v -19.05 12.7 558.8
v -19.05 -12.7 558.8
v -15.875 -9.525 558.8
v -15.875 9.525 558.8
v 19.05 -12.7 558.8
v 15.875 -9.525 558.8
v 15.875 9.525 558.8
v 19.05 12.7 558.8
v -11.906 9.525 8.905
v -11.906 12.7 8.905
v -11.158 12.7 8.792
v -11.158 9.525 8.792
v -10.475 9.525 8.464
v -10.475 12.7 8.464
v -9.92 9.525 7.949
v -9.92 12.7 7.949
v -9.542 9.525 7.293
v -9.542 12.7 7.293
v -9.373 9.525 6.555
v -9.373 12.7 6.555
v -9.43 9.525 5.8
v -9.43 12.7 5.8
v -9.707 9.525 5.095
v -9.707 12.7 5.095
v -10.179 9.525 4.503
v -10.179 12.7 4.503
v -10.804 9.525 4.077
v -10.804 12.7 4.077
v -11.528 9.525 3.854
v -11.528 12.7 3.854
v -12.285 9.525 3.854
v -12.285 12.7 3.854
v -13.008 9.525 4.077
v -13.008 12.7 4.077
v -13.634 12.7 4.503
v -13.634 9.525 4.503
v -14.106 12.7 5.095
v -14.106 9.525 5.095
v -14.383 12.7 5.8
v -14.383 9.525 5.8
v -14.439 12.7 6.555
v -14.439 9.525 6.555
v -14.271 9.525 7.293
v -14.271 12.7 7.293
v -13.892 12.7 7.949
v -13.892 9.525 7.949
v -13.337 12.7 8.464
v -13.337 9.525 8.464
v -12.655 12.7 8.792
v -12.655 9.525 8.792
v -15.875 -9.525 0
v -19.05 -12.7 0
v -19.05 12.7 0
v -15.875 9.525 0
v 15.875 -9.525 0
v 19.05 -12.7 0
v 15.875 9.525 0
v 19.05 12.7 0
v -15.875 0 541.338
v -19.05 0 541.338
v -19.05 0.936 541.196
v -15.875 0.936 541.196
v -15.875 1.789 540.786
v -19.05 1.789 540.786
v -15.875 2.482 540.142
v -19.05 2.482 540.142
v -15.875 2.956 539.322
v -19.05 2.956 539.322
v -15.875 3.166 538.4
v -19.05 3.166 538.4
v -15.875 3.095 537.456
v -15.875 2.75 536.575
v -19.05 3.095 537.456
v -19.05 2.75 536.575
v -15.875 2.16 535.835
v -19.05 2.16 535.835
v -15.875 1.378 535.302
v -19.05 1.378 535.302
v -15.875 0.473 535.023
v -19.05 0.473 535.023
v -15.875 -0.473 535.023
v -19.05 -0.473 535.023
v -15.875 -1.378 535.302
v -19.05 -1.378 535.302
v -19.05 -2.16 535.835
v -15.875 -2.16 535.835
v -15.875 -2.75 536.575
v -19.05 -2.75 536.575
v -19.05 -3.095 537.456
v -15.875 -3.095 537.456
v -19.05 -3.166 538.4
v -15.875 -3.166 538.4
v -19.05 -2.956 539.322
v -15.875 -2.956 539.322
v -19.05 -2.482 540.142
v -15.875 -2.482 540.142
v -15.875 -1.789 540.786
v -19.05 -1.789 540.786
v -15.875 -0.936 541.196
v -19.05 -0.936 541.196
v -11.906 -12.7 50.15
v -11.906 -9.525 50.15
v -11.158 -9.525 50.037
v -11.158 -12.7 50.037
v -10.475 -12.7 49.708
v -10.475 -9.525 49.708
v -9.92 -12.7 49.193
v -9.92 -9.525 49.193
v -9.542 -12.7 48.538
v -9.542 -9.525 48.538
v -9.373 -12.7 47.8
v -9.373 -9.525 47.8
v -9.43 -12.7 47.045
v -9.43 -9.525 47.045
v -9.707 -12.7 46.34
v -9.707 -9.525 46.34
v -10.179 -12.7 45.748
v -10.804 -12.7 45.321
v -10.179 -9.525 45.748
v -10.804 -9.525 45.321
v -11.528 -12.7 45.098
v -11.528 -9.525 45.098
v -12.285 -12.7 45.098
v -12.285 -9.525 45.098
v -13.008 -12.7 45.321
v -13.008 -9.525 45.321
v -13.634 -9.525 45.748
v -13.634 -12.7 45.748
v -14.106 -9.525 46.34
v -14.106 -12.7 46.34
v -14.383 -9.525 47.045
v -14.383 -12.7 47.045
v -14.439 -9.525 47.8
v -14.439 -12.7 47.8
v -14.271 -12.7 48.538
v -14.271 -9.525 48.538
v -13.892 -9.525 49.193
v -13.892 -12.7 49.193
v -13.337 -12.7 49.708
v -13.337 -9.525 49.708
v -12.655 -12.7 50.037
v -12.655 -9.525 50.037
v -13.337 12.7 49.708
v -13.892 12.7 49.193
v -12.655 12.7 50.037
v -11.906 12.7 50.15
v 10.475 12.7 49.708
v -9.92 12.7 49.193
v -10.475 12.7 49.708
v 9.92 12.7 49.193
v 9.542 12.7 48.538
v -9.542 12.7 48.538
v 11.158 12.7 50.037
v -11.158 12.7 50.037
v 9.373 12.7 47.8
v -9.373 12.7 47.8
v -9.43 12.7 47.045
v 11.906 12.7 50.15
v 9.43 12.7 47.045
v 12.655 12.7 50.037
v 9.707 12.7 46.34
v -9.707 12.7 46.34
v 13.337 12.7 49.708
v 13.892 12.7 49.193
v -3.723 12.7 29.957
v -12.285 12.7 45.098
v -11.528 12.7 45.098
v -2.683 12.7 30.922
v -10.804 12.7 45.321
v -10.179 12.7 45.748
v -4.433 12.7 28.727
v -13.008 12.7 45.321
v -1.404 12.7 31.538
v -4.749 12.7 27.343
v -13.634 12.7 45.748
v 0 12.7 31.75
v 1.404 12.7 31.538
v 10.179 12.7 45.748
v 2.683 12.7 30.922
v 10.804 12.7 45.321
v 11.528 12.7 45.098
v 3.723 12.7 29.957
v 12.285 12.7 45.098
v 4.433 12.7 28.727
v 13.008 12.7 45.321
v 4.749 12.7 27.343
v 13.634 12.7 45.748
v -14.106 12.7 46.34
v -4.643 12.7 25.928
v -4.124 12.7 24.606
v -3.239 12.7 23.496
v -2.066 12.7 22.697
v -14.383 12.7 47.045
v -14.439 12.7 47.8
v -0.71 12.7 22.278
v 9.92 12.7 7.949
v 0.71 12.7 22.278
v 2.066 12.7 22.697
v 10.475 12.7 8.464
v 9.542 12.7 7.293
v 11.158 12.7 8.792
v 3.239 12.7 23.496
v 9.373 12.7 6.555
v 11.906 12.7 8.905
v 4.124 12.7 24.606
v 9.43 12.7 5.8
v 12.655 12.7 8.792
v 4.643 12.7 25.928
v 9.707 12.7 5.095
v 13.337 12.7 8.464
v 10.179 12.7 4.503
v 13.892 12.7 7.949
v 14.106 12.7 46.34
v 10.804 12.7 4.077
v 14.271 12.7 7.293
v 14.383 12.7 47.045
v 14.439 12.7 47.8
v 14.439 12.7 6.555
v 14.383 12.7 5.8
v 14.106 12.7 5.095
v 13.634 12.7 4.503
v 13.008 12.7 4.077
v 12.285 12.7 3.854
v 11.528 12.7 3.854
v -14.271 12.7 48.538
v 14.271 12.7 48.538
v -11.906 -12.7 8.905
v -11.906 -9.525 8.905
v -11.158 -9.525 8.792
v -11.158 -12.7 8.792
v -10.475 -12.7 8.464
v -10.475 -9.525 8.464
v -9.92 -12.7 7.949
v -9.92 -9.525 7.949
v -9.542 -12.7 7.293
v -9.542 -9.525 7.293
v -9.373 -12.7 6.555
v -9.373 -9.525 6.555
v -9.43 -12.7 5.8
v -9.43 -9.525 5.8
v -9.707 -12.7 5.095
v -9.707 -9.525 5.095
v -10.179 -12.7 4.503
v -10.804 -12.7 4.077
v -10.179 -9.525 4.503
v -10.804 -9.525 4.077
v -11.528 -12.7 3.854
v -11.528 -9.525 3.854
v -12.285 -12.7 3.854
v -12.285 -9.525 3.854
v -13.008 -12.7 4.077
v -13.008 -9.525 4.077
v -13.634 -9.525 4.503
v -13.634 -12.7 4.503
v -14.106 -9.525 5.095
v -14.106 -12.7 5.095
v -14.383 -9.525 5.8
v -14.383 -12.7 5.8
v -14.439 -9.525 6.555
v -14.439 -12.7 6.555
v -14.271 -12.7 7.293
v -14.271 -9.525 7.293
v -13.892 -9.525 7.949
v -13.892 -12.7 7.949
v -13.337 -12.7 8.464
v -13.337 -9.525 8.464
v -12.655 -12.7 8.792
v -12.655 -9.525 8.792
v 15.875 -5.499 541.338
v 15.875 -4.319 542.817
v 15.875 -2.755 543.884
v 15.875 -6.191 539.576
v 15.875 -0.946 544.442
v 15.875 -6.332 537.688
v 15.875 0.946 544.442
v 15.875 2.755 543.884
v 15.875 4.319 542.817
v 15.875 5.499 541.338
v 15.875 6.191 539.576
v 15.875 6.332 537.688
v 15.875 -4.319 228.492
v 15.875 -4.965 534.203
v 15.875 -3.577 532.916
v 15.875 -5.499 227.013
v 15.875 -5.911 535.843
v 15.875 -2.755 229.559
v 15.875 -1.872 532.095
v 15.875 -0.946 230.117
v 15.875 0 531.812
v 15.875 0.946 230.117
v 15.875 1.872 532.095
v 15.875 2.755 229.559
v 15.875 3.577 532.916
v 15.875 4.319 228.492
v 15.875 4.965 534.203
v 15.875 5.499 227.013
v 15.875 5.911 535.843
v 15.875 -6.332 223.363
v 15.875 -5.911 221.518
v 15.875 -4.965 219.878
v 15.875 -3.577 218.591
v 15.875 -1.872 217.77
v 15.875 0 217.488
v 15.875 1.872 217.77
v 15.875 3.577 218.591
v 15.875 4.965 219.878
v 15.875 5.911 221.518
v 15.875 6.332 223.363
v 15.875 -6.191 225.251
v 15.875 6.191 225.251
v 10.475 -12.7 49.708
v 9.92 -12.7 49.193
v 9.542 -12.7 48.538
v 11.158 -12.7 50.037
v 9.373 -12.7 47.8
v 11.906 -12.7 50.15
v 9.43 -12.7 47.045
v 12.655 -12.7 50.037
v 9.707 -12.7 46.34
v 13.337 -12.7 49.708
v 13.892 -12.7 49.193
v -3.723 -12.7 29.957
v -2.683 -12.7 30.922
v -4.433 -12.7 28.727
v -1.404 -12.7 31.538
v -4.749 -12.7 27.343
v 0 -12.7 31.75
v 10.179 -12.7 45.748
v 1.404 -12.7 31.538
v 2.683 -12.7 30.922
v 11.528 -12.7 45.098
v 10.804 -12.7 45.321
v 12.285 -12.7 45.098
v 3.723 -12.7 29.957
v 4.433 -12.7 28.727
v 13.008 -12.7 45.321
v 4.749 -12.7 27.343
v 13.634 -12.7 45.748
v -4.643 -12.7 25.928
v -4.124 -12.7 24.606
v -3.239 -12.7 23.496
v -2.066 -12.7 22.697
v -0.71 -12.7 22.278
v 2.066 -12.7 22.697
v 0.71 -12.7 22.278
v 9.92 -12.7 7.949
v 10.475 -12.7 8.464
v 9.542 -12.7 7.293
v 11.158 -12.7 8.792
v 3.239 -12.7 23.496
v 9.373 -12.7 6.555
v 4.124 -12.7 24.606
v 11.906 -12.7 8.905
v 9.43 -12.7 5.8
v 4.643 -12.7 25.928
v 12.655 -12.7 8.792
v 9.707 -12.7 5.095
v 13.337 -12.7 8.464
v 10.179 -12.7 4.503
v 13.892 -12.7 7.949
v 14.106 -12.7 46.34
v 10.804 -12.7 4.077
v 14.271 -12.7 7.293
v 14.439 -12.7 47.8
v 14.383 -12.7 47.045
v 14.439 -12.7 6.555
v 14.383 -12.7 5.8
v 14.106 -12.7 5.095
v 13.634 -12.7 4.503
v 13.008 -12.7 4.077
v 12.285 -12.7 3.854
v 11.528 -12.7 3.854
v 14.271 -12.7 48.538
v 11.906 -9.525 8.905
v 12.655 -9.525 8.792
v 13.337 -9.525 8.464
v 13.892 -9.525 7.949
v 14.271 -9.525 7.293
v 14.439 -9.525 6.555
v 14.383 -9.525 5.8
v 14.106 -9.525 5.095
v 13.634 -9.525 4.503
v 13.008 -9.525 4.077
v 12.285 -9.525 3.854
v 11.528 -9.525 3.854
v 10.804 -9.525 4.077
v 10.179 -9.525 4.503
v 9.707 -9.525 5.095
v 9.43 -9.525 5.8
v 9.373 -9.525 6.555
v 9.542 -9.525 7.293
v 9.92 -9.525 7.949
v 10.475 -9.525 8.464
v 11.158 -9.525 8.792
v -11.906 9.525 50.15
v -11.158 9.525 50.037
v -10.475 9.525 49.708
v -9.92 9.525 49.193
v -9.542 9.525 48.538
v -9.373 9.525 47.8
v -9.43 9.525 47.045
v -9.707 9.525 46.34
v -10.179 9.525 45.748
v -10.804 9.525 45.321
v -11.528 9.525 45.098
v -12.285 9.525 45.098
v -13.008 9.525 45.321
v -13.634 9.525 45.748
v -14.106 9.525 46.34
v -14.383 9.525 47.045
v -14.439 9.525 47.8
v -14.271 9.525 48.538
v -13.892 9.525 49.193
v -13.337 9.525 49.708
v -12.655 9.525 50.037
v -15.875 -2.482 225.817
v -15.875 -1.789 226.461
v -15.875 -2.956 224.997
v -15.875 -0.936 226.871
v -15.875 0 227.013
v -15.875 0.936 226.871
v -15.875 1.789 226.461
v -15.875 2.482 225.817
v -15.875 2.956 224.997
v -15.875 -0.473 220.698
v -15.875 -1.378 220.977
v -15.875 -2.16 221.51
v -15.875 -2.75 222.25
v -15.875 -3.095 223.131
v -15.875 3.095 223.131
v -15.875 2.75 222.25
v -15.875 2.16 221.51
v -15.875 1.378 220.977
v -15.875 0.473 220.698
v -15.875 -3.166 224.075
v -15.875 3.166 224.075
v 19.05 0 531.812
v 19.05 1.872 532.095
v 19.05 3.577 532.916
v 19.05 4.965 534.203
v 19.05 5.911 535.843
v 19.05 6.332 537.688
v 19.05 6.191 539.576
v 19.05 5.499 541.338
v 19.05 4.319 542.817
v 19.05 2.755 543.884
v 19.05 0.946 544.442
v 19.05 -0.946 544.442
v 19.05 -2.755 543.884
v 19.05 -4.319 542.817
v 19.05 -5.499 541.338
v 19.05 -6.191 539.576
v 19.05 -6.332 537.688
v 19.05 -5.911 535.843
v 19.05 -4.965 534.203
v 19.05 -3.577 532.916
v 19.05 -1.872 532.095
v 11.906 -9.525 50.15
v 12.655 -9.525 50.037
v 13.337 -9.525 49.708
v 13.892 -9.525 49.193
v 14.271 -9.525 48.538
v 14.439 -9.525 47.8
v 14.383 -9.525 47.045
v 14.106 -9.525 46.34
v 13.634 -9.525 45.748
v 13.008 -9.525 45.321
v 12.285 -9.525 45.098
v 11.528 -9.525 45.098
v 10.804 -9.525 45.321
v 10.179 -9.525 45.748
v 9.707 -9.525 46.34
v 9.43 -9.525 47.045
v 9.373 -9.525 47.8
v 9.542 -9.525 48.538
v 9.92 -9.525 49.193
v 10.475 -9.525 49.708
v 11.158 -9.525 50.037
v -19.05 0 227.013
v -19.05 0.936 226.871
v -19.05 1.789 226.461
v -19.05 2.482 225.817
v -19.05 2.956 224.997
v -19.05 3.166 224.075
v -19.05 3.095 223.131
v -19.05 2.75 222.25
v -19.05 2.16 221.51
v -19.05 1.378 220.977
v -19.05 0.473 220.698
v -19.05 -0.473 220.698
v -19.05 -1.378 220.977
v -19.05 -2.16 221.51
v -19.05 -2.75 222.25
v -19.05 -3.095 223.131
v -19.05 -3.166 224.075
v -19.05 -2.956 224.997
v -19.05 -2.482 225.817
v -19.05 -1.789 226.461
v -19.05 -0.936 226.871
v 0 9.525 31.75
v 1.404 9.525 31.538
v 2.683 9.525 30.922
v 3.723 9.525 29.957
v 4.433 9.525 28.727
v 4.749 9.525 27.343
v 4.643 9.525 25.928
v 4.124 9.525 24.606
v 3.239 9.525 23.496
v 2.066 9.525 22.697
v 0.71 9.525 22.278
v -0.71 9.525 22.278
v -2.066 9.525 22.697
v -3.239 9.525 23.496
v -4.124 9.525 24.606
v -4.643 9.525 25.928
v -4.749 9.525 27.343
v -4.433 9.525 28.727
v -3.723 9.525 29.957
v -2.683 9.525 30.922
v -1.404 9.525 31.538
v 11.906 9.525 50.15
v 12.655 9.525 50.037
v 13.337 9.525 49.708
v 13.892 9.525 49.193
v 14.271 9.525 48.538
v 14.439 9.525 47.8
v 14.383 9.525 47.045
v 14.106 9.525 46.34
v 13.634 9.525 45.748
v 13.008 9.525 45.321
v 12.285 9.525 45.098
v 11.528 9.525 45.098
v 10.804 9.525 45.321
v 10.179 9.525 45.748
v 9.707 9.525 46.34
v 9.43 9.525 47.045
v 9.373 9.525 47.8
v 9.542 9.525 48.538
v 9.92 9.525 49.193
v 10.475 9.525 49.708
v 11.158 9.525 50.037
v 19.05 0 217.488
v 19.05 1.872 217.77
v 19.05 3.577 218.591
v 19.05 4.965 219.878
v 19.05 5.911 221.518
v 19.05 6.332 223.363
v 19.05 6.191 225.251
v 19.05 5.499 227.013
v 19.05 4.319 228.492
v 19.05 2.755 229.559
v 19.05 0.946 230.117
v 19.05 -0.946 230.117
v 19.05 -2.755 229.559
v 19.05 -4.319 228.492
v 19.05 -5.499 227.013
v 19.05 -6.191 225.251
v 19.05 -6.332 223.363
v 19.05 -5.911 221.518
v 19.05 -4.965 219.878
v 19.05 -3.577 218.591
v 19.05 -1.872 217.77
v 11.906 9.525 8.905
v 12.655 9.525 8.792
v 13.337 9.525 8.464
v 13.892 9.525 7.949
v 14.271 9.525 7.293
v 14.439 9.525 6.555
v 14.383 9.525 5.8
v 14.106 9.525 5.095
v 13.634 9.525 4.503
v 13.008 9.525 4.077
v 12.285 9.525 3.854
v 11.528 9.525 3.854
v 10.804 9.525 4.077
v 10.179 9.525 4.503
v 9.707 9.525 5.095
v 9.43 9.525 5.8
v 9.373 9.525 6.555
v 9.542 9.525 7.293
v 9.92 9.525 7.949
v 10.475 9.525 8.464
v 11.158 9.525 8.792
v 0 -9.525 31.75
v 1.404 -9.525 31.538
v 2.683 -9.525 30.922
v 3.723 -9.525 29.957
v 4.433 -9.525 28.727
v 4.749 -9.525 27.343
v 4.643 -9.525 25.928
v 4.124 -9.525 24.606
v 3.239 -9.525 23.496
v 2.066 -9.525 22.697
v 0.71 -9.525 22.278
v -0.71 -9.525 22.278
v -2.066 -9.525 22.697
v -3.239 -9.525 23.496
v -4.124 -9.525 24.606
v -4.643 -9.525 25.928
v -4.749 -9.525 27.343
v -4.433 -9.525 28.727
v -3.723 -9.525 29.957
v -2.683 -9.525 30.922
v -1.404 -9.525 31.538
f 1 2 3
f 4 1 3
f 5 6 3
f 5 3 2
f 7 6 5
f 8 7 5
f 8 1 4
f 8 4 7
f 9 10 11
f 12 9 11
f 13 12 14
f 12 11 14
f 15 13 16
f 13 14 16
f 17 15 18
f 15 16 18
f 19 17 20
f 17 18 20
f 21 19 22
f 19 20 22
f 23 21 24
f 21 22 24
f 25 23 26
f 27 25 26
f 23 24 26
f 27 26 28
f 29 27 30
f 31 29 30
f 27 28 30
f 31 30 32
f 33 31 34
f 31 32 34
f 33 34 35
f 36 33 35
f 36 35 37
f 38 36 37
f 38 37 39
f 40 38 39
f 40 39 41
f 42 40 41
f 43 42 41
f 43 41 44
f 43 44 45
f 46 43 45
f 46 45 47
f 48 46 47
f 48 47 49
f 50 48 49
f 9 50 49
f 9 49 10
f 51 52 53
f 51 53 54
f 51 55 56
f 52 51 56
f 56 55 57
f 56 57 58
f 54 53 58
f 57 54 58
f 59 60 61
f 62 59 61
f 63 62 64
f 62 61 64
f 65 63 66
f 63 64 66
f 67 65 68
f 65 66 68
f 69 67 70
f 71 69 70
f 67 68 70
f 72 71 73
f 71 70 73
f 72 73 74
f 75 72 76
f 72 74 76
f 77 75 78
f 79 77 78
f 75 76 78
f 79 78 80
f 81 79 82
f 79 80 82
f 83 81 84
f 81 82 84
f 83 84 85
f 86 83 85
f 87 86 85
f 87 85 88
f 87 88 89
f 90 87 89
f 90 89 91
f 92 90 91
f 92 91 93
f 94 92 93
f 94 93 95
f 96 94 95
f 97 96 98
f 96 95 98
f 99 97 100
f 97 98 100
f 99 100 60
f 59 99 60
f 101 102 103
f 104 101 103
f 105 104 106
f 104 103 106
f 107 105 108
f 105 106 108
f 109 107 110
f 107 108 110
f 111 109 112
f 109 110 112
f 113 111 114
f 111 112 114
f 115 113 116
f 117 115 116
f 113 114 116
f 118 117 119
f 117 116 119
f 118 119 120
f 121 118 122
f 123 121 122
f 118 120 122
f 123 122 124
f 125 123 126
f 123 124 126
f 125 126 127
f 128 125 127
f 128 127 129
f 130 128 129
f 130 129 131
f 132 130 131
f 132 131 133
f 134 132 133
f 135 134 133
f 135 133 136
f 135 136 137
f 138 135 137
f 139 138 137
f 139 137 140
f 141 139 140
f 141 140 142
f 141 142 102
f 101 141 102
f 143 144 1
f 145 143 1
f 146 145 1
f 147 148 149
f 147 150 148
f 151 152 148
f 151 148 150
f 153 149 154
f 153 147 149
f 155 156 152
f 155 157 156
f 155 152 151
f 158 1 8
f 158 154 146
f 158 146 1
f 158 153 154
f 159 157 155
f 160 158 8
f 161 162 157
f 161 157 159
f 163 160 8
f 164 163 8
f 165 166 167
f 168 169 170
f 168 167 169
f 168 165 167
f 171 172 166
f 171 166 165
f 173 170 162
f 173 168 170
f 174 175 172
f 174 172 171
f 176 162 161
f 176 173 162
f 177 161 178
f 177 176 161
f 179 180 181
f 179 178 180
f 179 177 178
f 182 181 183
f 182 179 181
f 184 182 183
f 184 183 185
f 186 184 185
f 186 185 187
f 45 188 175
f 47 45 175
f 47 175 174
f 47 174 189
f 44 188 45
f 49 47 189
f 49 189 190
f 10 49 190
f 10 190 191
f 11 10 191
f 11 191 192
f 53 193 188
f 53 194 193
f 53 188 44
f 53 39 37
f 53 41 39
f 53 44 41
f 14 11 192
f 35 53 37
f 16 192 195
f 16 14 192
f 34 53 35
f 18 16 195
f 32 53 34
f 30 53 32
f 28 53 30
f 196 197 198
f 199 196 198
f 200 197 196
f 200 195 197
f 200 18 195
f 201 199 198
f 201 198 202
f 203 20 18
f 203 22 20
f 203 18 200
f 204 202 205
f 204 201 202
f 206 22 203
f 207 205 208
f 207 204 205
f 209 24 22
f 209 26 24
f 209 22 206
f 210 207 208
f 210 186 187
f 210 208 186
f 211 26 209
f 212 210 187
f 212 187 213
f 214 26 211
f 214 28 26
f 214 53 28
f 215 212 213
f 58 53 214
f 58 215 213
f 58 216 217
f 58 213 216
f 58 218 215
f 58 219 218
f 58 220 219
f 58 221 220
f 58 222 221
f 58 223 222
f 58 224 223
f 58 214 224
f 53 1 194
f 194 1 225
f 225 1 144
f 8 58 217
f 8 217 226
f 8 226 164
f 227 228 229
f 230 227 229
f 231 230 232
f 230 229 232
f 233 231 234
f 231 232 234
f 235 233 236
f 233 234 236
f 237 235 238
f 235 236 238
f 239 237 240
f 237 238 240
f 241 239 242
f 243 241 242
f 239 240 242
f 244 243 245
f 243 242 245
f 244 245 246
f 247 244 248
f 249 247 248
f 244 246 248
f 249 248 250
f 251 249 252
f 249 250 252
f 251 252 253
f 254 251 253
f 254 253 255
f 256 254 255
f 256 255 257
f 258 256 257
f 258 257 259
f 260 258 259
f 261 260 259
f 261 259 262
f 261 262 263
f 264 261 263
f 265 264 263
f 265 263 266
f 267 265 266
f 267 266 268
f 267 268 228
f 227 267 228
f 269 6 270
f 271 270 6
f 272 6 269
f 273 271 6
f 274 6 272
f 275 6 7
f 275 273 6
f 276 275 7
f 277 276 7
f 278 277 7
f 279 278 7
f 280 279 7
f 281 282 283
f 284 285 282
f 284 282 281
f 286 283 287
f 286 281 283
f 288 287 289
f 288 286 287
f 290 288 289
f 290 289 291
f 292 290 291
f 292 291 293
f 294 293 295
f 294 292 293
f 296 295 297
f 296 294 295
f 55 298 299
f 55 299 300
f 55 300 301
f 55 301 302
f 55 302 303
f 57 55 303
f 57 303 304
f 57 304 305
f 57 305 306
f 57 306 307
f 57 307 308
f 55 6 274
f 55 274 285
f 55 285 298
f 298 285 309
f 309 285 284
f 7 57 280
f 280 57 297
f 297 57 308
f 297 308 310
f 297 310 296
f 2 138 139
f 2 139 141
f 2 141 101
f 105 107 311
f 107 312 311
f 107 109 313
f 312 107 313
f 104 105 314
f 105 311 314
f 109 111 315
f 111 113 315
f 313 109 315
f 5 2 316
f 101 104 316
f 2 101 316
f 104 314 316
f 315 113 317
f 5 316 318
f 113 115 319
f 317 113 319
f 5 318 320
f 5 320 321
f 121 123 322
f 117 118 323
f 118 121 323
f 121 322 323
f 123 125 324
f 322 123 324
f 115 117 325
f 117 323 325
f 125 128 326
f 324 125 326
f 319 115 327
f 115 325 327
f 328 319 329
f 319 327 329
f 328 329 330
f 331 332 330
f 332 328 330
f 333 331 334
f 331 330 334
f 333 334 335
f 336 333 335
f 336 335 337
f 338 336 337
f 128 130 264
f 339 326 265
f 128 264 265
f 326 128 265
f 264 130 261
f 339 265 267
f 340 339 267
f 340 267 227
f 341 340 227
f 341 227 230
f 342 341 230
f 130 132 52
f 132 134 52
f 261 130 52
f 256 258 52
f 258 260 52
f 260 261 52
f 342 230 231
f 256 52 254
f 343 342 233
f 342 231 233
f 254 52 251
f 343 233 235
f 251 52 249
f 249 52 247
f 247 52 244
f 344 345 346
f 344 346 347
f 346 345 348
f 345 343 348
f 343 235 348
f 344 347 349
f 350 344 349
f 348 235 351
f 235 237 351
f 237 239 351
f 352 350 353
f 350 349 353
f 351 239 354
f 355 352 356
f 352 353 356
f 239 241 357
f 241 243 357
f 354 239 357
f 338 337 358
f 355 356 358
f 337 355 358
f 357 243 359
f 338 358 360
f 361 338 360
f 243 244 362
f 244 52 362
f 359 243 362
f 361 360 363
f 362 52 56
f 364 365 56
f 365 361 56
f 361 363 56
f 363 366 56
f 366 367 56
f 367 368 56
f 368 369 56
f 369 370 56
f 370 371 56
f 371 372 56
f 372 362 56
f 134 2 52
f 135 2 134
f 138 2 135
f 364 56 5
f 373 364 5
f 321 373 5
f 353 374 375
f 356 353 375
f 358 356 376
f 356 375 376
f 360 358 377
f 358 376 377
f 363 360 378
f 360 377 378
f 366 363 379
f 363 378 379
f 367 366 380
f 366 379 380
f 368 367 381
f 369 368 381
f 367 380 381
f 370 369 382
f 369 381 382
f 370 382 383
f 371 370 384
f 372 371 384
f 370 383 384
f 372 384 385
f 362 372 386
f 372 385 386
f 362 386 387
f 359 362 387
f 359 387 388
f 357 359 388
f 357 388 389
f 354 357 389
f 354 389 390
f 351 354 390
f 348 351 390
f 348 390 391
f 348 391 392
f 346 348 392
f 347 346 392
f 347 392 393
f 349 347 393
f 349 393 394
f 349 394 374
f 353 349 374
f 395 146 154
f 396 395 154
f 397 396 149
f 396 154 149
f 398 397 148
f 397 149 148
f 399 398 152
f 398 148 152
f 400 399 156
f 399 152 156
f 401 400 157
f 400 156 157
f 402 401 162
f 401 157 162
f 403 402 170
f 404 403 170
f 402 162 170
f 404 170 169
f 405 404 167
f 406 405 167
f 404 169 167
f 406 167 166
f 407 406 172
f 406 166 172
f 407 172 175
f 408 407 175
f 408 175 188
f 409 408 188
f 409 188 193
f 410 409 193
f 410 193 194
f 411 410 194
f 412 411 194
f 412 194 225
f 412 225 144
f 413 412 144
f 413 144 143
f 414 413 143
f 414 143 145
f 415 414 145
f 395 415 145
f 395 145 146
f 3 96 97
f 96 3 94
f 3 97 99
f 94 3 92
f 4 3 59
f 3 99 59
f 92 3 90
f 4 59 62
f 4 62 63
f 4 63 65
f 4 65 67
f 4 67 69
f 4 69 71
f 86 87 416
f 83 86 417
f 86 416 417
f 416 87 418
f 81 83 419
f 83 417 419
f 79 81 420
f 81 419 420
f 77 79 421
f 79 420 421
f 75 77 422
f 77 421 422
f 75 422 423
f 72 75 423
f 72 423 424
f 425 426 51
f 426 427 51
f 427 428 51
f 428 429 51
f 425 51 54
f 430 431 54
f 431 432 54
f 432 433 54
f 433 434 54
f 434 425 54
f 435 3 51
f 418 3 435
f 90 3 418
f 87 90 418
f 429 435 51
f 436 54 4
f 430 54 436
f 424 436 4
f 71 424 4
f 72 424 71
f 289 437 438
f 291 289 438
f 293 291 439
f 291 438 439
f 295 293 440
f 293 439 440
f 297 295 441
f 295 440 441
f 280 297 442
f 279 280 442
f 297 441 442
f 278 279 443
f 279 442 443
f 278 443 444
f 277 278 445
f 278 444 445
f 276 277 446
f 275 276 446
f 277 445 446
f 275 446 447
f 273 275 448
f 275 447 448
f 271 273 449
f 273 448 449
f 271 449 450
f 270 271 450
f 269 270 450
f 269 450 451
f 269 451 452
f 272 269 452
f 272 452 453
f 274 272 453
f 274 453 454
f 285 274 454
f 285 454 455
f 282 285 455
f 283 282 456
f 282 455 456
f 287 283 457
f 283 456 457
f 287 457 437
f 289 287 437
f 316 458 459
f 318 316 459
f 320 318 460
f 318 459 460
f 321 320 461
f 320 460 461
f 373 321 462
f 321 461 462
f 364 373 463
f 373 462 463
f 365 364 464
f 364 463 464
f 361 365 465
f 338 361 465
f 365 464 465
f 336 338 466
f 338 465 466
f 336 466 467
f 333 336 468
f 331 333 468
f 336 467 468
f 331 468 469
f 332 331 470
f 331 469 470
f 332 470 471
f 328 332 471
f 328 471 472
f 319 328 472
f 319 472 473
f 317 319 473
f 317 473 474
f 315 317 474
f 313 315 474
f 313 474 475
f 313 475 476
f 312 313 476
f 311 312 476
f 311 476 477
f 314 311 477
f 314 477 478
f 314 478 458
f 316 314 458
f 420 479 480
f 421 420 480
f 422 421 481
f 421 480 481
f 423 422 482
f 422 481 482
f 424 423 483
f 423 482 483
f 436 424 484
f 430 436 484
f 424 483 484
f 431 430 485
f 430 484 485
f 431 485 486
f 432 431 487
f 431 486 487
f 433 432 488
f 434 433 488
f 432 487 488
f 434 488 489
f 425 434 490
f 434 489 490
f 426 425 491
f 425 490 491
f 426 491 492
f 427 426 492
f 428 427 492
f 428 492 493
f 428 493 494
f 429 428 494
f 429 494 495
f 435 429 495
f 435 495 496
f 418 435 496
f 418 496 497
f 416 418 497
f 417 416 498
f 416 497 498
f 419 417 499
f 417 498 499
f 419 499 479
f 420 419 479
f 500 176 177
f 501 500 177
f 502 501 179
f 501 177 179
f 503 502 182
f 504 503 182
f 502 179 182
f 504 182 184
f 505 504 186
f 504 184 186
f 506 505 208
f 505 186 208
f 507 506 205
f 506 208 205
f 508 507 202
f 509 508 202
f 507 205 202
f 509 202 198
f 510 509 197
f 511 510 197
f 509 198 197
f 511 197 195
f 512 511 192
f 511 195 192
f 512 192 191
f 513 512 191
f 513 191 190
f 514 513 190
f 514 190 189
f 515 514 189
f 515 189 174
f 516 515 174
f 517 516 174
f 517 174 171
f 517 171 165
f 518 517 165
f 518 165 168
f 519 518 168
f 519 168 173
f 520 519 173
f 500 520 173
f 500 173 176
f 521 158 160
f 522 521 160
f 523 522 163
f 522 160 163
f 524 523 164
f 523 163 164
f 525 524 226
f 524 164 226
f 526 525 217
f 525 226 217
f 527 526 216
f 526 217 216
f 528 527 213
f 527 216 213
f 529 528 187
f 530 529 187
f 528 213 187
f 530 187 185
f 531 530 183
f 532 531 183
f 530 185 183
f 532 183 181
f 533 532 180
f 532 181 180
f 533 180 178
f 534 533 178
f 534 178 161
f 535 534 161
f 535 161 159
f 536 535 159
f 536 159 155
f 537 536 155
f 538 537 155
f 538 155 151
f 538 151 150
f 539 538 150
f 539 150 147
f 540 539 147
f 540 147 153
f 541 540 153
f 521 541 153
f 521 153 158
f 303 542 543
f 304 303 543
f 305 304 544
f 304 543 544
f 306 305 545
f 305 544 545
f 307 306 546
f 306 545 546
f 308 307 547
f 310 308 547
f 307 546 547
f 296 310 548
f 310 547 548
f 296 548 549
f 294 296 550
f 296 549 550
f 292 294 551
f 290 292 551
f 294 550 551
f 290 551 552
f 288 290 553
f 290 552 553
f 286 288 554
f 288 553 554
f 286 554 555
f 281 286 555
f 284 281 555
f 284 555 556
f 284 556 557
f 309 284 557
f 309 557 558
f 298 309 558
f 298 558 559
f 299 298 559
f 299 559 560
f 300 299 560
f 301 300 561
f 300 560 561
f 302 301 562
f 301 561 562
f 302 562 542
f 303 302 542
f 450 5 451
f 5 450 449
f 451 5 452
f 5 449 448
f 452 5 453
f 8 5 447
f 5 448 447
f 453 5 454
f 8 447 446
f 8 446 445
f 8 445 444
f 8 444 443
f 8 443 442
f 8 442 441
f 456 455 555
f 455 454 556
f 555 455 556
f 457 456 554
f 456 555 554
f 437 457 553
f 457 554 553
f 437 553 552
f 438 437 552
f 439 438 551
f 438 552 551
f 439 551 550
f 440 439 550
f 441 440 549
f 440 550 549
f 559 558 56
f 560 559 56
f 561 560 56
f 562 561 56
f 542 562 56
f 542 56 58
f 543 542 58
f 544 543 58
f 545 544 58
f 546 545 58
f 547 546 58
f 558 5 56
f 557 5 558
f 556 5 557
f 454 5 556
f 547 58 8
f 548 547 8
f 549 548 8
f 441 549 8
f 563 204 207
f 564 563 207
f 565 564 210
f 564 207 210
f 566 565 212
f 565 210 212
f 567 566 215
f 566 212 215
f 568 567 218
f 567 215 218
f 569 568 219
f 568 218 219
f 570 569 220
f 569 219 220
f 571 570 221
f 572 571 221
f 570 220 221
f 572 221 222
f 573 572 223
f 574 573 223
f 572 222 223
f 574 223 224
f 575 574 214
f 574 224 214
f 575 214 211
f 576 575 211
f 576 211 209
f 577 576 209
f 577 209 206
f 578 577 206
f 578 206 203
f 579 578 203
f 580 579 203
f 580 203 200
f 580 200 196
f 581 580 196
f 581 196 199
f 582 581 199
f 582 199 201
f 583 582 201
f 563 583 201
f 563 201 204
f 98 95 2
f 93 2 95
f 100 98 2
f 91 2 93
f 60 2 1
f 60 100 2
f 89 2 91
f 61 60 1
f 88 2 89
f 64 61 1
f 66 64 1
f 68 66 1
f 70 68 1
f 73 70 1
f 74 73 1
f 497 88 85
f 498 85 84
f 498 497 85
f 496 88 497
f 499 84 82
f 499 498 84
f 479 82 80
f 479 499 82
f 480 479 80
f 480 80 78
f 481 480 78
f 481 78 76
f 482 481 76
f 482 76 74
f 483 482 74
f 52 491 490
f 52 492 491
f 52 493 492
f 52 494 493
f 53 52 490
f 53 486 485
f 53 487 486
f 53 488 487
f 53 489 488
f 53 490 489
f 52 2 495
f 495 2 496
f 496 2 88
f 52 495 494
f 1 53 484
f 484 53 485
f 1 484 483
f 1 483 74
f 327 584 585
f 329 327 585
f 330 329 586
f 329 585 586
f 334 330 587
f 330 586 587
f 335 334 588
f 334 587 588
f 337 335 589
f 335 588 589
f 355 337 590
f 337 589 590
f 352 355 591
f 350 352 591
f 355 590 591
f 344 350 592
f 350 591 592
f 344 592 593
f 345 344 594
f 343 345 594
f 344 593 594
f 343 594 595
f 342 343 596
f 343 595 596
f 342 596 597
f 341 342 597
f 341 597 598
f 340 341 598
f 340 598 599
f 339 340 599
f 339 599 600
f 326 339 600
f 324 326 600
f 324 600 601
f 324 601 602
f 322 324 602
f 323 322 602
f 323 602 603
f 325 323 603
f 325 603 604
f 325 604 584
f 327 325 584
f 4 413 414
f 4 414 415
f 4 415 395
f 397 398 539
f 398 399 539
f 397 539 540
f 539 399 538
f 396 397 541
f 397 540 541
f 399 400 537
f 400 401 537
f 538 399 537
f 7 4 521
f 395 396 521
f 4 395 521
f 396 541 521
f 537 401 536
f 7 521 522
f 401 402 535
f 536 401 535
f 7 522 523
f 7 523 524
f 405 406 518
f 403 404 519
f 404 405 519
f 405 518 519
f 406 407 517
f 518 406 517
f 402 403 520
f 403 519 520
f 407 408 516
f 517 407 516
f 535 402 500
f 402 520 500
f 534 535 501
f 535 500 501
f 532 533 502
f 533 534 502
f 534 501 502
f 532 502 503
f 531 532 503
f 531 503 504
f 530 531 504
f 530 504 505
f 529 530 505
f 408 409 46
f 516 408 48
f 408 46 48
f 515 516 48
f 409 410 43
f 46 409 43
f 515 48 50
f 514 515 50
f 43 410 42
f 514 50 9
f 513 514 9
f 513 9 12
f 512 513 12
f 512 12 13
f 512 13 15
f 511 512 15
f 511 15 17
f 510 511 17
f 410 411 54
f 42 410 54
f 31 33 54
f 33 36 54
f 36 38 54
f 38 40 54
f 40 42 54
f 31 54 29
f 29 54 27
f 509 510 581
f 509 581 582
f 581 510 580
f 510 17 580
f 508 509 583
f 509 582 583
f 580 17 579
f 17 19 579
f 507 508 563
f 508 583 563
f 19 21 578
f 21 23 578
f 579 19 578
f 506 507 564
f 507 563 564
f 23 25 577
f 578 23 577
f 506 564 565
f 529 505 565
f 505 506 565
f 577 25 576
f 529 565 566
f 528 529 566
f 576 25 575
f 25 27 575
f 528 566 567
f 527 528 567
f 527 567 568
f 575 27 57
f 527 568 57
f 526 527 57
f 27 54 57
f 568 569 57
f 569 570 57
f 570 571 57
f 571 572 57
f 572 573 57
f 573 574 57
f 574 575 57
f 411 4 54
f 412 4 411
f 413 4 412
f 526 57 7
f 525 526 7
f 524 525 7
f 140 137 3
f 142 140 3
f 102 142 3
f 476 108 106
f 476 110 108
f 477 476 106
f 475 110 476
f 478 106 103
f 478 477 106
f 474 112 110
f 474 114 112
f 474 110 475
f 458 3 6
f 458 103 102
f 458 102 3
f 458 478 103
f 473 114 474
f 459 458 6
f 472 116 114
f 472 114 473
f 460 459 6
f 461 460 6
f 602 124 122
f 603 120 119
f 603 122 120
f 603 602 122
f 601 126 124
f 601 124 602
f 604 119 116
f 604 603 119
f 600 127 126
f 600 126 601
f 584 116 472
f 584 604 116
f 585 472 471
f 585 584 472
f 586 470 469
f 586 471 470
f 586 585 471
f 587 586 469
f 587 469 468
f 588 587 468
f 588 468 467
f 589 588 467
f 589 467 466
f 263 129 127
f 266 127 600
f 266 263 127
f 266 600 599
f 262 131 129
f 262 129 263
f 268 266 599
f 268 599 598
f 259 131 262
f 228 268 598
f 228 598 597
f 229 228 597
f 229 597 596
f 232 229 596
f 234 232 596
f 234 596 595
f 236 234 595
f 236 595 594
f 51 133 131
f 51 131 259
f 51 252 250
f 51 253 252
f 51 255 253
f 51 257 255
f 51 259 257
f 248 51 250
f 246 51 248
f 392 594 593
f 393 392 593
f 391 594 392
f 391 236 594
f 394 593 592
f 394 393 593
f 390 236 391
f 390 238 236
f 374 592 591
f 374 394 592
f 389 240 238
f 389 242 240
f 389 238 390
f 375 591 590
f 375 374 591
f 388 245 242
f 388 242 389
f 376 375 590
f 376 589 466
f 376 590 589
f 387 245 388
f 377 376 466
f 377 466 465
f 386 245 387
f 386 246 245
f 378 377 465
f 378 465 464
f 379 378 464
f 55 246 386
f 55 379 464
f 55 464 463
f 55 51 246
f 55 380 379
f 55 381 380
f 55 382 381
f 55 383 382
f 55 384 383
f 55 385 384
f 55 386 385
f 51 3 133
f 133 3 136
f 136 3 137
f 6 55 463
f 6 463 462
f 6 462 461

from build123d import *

# Parameters (mm, degrees)
SKETCH1_W           = 38.1
SKETCH1_H           = 25.4
SKETCH1_W_2         = 31.75
SKETCH1_H_2         = 19.05
BOSS_EXTRUDE1_DEPTH = 558.8
CUT_EXTRUDE1_REACH  = 561.701
SKETCH2_R           = 4.7625
SKETCH2_R_2         = 2.54
SKETCH3_R           = 3.175
CUT_EXTRUDE2_DEPTH  = 3.175
SKETCH4_R           = 6.35
CUT_EXTRUDE3_DEPTH  = 3.175


with BuildPart() as part:
    # Sketch1 → Boss-Extrude1 (new body)
    with BuildSketch(Plane.XY):
        Rectangle(SKETCH1_W, SKETCH1_H)
        Rectangle(SKETCH1_W_2, SKETCH1_H_2, mode=Mode.SUBTRACT)
    extrude(amount=BOSS_EXTRUDE1_DEPTH)

    # Cut-Extrude1: up to this face of the body (flat: up to its plane)
    cut_extrude1_end = Plane(part.part.faces().sort_by_distance((0, -12.7, 279.4))[0])
    # Sketch2 → Cut-Extrude1 (cut, up to the picked face)
    with BuildSketch(Plane(origin=(0, 12.7, 0), x_dir=(1, 0, 0), z_dir=(0, 1, 0)), mode=Mode.PRIVATE) as cut_extrude1_sk1:
        with Locations(Location((0, -26.9875, 0), (0, 0, 270))):
            Circle(SKETCH2_R)
    cut_extrude1_tool1 = split(extrude(cut_extrude1_sk1.sketch, amount=-CUT_EXTRUDE1_REACH, mode=Mode.PRIVATE), bisect_by=cut_extrude1_end, keep=Keep.BOTH, mode=Mode.PRIVATE)
    # Sketch2 → Cut-Extrude1 (cut, up to the picked face)
    with BuildSketch(Plane(origin=(0, 12.7, 0), x_dir=(1, 0, 0), z_dir=(0, 1, 0)), mode=Mode.PRIVATE) as cut_extrude1_sk2:
        with Locations(Location((11.90625, -47.609729928, 0), (0, 0, 270))):
            Circle(SKETCH2_R_2)
    cut_extrude1_tool2 = split(extrude(cut_extrude1_sk2.sketch, amount=-CUT_EXTRUDE1_REACH, mode=Mode.PRIVATE), bisect_by=cut_extrude1_end, keep=Keep.BOTH, mode=Mode.PRIVATE)
    # Sketch2 → Cut-Extrude1 (cut, up to the picked face)
    with BuildSketch(Plane(origin=(0, 12.7, 0), x_dir=(1, 0, 0), z_dir=(0, 1, 0)), mode=Mode.PRIVATE) as cut_extrude1_sk3:
        with Locations(Location((-11.90625, -47.609729928, 0), (0, 0, 270))):
            Circle(SKETCH2_R_2)
    cut_extrude1_tool3 = split(extrude(cut_extrude1_sk3.sketch, amount=-CUT_EXTRUDE1_REACH, mode=Mode.PRIVATE), bisect_by=cut_extrude1_end, keep=Keep.BOTH, mode=Mode.PRIVATE)
    # Sketch2 → Cut-Extrude1 (cut, up to the picked face)
    with BuildSketch(Plane(origin=(0, 12.7, 0), x_dir=(1, 0, 0), z_dir=(0, 1, 0)), mode=Mode.PRIVATE) as cut_extrude1_sk4:
        with Locations(Location((-11.90625, -6.365270072, 0), (0, 0, 270))):
            Circle(SKETCH2_R_2)
    cut_extrude1_tool4 = split(extrude(cut_extrude1_sk4.sketch, amount=-CUT_EXTRUDE1_REACH, mode=Mode.PRIVATE), bisect_by=cut_extrude1_end, keep=Keep.BOTH, mode=Mode.PRIVATE)
    # Sketch2 → Cut-Extrude1 (cut, up to the picked face)
    with BuildSketch(Plane(origin=(0, 12.7, 0), x_dir=(1, 0, 0), z_dir=(0, 1, 0)), mode=Mode.PRIVATE) as cut_extrude1_sk5:
        with Locations(Location((11.90625, -6.365270072, 0), (0, 0, 270))):
            Circle(SKETCH2_R_2)
    cut_extrude1_tool5 = split(extrude(cut_extrude1_sk5.sketch, amount=-CUT_EXTRUDE1_REACH, mode=Mode.PRIVATE), bisect_by=cut_extrude1_end, keep=Keep.BOTH, mode=Mode.PRIVATE)
    add(cut_extrude1_tool1.solids().sort_by(Axis((0, 12.7, 26.9875), (0, -1, 0)))[0], mode=Mode.SUBTRACT)
    add(cut_extrude1_tool2.solids().sort_by(Axis((11.90625, 12.7, 47.60973), (0, -1, 0)))[0], mode=Mode.SUBTRACT)
    add(cut_extrude1_tool3.solids().sort_by(Axis((-11.90625, 12.7, 47.60973), (0, -1, 0)))[0], mode=Mode.SUBTRACT)
    add(cut_extrude1_tool4.solids().sort_by(Axis((-11.90625, 12.7, 6.36527), (0, -1, 0)))[0], mode=Mode.SUBTRACT)
    add(cut_extrude1_tool5.solids().sort_by(Axis((11.90625, 12.7, 6.36527), (0, -1, 0)))[0], mode=Mode.SUBTRACT)

    # Sketch3 → Cut-Extrude2 (cut)
    with BuildSketch(Plane.ZY.offset(19.05)):
        with Locations((538.1625, 0)):
            Circle(SKETCH3_R)
        with Locations((223.8375, 0)):
            Circle(SKETCH3_R)
    extrude(amount=-CUT_EXTRUDE2_DEPTH, mode=Mode.SUBTRACT)

    # Sketch4 → Cut-Extrude3 (cut)
    with BuildSketch(Plane(origin=(19.05, 0, 0), x_dir=(0, 0, -1), z_dir=(1, 0, 0))):
        with Locations((-223.8375, 0)):
            Circle(SKETCH4_R)
        with Locations((-538.1625, 0)):
            Circle(SKETCH4_R)
    extrude(amount=-CUT_EXTRUDE3_DEPTH, mode=Mode.SUBTRACT)


solid = part.part
